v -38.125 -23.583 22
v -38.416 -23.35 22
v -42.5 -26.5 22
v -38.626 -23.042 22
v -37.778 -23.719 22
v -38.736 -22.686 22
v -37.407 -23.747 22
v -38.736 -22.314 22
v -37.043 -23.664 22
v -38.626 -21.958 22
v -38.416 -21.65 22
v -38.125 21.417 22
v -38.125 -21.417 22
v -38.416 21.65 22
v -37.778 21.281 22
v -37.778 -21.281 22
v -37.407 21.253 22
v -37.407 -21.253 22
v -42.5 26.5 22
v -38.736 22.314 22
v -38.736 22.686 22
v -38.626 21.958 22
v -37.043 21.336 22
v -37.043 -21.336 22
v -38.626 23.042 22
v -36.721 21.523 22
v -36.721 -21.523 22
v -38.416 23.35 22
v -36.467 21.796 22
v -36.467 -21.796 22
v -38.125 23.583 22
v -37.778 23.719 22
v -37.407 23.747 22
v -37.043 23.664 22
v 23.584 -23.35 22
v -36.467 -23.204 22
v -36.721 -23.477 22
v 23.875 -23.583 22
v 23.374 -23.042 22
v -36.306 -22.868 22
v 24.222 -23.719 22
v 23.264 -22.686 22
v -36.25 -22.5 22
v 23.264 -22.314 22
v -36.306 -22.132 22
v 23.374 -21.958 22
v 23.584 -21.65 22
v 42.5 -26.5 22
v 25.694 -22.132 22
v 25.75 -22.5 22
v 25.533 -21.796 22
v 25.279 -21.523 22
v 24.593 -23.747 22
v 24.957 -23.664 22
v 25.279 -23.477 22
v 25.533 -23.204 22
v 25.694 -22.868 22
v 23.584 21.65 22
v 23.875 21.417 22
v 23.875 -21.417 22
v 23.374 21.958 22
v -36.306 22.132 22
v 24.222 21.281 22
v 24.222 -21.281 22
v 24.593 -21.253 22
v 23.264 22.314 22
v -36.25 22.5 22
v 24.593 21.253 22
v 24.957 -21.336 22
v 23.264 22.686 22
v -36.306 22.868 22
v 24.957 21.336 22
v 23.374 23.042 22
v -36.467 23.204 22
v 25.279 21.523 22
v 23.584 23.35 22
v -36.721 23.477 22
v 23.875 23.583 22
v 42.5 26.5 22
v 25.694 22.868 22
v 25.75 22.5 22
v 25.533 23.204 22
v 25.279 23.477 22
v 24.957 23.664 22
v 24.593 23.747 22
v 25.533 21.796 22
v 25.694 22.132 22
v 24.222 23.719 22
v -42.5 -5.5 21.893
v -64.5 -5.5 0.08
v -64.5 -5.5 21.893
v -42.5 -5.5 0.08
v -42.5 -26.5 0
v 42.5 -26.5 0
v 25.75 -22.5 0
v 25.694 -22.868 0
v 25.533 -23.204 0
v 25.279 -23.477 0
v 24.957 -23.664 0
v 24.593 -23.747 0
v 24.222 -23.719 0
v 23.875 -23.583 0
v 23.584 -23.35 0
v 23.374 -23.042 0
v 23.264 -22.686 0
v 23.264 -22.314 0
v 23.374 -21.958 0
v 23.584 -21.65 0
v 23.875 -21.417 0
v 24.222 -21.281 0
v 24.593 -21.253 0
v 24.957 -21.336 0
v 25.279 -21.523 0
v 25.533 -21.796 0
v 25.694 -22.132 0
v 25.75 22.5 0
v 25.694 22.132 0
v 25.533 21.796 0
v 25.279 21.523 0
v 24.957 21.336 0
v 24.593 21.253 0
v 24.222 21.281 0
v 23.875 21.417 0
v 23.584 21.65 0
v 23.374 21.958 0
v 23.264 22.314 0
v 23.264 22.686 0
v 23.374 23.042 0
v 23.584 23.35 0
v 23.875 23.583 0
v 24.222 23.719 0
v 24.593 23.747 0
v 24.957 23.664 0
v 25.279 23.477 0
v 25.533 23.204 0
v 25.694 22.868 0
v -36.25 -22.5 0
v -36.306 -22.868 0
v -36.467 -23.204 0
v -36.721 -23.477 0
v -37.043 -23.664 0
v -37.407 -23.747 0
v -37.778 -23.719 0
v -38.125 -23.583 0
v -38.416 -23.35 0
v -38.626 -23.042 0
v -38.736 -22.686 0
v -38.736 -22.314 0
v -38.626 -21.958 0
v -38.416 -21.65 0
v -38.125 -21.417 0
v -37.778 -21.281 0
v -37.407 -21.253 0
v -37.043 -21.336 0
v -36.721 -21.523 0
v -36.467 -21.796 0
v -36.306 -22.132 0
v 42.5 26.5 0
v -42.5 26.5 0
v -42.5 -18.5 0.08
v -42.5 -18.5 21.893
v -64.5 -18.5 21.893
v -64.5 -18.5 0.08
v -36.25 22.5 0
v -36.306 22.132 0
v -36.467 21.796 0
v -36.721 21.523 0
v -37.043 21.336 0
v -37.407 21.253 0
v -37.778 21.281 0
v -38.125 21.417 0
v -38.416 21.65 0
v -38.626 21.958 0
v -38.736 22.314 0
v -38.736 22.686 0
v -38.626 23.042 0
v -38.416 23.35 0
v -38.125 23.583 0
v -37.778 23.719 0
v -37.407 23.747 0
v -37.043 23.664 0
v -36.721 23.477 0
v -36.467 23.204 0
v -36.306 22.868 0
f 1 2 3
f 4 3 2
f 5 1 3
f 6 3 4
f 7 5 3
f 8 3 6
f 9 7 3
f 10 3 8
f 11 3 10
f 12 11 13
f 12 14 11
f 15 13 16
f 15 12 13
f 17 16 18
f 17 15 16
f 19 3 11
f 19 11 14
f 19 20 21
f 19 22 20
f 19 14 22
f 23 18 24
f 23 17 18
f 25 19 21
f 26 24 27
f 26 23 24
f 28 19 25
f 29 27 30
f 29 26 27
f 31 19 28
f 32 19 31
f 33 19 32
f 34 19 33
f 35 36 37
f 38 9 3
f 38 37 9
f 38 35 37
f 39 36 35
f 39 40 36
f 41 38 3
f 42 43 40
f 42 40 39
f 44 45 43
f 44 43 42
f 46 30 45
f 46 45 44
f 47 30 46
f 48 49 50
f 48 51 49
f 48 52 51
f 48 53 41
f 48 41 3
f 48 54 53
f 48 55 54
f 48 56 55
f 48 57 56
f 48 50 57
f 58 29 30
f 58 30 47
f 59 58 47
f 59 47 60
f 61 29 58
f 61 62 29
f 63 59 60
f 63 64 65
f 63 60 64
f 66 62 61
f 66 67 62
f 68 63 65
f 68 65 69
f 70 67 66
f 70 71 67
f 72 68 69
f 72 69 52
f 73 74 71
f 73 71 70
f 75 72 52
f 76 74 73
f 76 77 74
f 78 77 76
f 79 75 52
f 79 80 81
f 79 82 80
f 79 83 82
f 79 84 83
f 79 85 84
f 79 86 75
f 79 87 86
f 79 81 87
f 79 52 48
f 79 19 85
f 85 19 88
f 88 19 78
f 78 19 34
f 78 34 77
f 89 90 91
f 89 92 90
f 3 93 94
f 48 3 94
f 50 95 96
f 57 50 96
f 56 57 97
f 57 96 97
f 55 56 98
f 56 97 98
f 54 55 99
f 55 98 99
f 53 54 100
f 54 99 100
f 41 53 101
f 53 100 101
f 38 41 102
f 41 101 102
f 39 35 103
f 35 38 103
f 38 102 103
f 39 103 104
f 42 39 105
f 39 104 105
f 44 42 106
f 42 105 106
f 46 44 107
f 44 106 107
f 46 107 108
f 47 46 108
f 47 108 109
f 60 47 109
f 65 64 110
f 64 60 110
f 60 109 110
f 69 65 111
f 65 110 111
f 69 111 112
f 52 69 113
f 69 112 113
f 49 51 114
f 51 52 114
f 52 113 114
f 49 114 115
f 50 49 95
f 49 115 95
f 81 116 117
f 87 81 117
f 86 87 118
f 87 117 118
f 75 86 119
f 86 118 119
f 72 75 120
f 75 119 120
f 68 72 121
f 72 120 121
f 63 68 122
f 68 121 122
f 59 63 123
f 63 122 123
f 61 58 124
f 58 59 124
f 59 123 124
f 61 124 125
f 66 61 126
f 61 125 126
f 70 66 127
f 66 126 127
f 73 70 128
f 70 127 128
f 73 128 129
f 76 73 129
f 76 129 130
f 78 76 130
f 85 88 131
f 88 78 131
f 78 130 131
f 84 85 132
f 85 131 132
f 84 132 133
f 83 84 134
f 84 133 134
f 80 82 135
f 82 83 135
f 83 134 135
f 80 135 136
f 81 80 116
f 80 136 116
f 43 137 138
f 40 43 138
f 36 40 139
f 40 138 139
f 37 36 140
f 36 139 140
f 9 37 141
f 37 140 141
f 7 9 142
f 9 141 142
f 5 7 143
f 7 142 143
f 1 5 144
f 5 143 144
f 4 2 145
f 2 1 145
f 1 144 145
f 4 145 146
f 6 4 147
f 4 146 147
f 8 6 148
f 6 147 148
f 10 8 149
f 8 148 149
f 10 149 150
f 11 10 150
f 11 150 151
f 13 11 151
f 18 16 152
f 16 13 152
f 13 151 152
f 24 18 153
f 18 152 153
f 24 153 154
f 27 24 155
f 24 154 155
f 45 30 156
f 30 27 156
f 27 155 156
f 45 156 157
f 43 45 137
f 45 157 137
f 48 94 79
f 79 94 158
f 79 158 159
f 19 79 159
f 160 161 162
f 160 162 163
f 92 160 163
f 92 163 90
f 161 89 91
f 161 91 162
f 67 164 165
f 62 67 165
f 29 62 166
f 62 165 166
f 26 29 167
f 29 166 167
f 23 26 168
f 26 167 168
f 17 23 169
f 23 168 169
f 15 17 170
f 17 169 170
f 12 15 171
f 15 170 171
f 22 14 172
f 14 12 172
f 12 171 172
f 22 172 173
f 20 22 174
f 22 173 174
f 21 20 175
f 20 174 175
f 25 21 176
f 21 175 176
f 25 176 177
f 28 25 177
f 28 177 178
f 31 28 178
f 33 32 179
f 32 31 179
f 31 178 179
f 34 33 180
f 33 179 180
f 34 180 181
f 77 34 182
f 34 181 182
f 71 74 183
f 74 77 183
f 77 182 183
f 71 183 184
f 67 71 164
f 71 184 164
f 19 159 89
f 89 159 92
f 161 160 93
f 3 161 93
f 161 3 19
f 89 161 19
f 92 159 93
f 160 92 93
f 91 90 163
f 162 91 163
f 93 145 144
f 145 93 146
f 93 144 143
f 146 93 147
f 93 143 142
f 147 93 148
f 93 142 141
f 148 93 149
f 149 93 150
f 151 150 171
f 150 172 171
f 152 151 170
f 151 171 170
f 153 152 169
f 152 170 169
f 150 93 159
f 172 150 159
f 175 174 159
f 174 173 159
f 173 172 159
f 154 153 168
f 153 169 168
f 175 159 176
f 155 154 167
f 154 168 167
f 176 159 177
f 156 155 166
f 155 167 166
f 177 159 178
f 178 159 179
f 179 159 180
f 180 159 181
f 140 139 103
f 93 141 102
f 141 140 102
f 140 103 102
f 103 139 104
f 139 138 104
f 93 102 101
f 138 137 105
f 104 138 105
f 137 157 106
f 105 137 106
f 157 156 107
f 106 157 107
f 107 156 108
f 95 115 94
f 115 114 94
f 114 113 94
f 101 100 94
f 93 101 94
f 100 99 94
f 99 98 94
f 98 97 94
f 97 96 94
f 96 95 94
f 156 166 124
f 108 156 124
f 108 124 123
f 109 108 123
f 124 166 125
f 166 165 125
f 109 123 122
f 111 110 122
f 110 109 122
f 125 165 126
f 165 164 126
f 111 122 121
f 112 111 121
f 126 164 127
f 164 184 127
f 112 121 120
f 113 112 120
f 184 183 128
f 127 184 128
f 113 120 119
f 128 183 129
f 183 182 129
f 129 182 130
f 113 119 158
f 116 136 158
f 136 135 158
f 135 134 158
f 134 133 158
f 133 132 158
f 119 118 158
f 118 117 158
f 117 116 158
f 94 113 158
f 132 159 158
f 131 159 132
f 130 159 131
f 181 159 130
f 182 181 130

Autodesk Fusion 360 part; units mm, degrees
sketch "Esquisse5" plane through (0, 0, 0) normal (0, 0, 1) x (1, 0, 0)
  line L0 (42.5, 26.5) -> (-42.5, 26.5)
  line L1 (-42.5, 26.5) -> (-42.5, -26.5)
  line L2 (-42.5, -26.5) -> (42.5, -26.5)
  line L3 (42.5, -26.5) -> (42.5, 26.5)
  circle A0 centre (-37.5, 22.5) radius 1.25
  circle A1 centre (24.5, 22.5) radius 1.25
  circle A2 centre (-37.5, -22.5) radius 1.25
  circle A3 centre (24.5, -22.5) radius 1.25
  dimension "d39" = 85
  dimension "d40" = 53
  dimension "d41" = 2.5
  dimension "d42" = 2.5
  dimension "d43" = 2.5
  dimension "d44" = 2.5
  dimension "d45" = 5
  dimension "d46" = 62
  dimension "d47" = 4
  dimension "d48" = 4
  dimension "d49" = 4
  dimension "d50" = 4
  dimension "d51" = 62
  dimension "d52" = 5
extrude "Extrusion10" add sketch "Esquisse5" along normal blind 22
sketch "Esquisse6" plane through (-42.5, 0, 0) normal (-1, 0, 0) x (0, -1, 0)
  line L0 (-26.5, 0) -> (26.5, 0)
  line L1 (26.5, 0) -> (26.5, 22)
  line L2 (26.5, 22) -> (-26.5, 22)
  line L3 (-26.5, 22) -> (-26.5, 0)
  line L4 (5.5, 21.893) -> (18.5, 21.893)
  line L5 (18.5, 21.893) -> (18.5, 0.0802)
  line L6 (18.5, 0.0802) -> (5.5, 0.0802)
  line L7 (5.5, 0.0802) -> (5.5, 21.893)
  dimension "d55" = 32
  dimension "d56" = 45
extrude "Extrusion11" add sketch "Esquisse6" along normal blind 22 contours L4 L5 L6 L7
